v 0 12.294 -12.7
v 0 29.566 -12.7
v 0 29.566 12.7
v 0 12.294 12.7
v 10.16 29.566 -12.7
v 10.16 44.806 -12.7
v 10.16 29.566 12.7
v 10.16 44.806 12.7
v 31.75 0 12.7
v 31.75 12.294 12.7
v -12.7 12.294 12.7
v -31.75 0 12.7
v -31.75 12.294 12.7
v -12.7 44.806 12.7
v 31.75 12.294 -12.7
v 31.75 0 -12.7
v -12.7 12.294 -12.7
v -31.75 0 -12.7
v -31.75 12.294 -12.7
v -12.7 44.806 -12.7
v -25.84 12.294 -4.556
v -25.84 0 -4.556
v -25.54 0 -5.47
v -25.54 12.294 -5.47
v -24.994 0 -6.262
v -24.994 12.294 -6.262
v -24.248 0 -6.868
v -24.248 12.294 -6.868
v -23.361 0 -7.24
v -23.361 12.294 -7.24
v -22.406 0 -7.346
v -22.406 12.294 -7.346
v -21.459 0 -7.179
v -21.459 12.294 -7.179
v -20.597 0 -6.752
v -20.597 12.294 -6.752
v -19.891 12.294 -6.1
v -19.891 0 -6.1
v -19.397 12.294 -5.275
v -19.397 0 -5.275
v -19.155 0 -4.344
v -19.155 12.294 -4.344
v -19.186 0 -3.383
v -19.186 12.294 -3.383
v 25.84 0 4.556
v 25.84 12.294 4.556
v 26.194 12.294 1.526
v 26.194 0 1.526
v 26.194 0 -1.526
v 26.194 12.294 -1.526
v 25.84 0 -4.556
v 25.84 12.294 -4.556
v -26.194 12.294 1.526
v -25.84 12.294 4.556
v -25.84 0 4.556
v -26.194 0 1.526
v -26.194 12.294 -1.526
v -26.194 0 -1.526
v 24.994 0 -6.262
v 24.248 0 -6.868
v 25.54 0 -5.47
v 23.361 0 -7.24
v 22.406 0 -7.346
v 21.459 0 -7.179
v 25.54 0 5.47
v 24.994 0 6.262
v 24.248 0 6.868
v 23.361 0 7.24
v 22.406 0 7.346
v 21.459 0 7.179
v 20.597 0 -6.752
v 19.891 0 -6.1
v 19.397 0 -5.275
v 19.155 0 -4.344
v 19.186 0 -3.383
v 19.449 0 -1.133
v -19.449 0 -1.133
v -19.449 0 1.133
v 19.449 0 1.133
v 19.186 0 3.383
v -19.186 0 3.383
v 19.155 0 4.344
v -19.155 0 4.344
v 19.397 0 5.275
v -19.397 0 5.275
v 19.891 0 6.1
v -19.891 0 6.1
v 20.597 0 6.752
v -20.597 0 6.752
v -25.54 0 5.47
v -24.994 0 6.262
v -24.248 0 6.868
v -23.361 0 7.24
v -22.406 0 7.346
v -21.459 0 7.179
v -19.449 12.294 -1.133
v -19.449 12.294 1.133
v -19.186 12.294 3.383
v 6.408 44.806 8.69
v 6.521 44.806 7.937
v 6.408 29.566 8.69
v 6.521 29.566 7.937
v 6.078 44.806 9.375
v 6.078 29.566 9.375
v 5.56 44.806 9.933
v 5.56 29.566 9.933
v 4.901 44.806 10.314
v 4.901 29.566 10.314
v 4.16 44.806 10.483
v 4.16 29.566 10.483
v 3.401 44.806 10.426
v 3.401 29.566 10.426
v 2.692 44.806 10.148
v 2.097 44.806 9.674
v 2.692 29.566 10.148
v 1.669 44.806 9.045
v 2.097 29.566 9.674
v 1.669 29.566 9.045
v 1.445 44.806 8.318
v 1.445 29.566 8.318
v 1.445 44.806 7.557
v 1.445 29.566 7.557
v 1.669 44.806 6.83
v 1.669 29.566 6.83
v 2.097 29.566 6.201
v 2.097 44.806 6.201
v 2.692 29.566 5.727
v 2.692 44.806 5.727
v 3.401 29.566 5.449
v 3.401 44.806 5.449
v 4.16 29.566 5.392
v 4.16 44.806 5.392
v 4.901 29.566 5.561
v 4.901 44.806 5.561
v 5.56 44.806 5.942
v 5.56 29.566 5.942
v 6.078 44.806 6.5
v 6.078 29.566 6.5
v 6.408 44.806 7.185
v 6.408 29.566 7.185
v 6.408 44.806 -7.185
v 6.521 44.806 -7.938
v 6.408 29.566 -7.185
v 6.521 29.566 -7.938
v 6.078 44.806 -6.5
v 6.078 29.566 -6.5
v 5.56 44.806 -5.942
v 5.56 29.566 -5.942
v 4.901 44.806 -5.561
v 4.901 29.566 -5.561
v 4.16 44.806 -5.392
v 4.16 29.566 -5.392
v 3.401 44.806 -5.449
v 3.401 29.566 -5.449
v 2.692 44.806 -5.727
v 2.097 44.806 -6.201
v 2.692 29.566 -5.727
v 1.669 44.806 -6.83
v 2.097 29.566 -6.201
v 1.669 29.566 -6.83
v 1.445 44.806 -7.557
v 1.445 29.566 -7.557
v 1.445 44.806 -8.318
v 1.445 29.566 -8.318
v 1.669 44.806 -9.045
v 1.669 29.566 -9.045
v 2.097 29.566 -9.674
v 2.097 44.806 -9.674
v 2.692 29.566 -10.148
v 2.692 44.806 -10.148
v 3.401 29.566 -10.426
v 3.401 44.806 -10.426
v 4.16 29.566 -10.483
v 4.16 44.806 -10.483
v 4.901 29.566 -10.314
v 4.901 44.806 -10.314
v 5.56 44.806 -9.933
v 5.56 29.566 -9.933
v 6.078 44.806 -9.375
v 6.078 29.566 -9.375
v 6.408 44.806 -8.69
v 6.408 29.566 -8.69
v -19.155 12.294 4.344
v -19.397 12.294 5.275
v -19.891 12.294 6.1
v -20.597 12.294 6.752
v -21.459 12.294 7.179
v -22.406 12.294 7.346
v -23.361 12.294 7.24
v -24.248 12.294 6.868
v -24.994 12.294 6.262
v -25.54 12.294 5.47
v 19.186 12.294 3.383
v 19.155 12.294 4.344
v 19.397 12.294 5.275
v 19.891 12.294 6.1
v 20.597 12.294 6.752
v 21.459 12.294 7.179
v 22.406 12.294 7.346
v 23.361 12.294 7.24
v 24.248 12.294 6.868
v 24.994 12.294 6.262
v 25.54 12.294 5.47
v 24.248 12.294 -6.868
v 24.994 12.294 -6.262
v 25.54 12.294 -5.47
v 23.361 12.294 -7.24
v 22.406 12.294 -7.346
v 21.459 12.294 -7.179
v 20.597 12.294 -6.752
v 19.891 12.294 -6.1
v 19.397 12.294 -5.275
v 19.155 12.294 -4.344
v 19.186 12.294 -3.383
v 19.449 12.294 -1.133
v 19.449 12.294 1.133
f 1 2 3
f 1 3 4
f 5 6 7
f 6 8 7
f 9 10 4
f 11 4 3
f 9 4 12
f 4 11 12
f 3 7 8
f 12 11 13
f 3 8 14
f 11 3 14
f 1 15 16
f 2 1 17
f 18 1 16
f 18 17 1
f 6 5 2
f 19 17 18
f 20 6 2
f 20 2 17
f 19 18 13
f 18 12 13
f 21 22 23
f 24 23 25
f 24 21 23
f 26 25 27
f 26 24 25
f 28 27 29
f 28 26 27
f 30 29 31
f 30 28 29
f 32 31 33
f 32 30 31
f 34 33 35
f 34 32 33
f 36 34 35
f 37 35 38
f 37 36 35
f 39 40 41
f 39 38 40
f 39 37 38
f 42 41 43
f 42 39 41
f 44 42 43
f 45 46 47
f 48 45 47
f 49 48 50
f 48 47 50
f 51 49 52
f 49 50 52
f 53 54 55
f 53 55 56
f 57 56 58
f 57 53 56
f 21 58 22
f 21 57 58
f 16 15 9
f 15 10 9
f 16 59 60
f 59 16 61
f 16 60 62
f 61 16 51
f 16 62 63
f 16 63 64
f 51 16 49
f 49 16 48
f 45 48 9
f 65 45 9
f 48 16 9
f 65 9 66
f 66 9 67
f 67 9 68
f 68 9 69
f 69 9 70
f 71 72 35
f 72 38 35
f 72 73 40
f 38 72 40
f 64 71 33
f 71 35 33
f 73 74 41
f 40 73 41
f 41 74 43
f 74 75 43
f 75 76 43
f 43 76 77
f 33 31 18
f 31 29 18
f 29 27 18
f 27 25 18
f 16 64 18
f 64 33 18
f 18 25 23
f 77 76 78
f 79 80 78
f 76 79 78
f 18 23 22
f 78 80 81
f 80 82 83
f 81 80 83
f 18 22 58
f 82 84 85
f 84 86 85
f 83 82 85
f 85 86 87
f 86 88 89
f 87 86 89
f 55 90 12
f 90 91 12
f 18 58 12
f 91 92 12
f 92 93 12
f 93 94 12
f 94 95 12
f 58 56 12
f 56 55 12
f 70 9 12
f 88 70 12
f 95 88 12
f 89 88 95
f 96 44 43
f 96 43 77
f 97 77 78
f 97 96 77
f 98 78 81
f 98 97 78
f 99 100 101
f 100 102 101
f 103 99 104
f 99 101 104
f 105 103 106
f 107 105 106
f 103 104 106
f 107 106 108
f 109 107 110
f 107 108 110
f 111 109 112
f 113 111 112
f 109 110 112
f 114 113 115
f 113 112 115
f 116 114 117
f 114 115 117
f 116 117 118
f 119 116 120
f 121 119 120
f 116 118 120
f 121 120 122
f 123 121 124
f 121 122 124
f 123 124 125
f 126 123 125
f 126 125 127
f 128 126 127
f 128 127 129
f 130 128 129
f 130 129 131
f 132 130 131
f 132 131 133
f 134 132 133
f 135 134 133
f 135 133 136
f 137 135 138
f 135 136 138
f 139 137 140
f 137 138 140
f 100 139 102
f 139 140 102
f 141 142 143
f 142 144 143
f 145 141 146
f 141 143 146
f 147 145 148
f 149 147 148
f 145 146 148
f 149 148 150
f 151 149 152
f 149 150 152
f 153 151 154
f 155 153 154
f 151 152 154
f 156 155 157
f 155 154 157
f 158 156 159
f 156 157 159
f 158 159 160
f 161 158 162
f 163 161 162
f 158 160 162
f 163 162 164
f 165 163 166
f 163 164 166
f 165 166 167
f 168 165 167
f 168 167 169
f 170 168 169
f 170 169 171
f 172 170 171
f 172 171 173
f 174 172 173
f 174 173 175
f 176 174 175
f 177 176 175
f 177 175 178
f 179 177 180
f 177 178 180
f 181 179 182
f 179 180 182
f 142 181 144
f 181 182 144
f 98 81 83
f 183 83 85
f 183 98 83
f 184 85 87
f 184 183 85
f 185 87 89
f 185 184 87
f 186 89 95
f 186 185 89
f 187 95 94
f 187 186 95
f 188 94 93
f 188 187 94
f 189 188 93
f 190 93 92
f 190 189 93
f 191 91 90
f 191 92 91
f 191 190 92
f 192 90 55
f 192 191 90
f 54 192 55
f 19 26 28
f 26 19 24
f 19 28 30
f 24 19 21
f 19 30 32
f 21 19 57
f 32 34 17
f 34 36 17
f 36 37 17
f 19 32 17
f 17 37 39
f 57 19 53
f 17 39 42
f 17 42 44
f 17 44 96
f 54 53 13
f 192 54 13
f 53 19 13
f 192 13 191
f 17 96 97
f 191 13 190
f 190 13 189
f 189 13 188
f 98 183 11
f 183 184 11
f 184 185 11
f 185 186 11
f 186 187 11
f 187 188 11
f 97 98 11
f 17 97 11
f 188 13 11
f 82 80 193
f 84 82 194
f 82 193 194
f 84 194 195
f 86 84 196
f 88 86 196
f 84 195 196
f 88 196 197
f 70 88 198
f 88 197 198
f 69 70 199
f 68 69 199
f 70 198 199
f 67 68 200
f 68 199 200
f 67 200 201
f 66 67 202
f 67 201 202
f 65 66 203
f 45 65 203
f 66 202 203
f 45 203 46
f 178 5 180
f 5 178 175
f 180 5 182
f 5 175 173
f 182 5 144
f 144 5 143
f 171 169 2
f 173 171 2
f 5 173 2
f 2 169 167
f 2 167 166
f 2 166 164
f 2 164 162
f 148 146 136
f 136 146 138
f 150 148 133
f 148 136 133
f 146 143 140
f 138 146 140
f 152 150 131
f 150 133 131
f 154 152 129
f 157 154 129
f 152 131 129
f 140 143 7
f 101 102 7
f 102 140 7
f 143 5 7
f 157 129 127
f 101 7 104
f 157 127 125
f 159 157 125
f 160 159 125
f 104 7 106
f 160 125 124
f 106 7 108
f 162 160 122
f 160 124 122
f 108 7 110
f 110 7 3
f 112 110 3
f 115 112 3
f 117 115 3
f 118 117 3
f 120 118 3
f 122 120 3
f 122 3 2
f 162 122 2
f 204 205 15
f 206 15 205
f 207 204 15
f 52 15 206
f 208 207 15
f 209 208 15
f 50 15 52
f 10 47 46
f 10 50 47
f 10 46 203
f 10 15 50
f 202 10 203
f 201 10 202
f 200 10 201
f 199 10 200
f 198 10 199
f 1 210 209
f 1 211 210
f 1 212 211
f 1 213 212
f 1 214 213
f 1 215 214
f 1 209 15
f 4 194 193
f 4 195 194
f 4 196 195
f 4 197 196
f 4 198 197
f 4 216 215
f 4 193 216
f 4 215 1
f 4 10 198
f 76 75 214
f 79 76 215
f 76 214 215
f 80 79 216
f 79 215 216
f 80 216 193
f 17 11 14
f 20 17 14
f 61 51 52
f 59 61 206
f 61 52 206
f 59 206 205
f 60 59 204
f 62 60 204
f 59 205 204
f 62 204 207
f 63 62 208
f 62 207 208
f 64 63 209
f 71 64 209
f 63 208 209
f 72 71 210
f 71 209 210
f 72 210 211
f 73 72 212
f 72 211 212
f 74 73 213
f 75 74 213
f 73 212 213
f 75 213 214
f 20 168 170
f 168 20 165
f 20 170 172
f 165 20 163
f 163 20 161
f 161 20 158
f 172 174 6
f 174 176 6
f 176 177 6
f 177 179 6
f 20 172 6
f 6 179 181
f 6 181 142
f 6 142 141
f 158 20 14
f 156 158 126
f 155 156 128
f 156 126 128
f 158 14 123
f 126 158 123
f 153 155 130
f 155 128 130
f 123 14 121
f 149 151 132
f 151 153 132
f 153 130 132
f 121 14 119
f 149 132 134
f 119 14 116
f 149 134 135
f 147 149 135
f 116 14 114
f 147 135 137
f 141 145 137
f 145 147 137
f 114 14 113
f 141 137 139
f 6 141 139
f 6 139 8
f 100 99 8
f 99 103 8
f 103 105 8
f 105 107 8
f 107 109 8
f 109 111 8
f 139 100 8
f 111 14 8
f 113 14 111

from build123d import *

# Parameters (mm, degrees)
EXTRUDE1_DEPTH             = 12.7
ARC_MOUNTING_SLOT_I_DEPTH  = 48.184559381
CLAMPING_SCREW_HOLES_D     = 5.1054
CLAMPING_SCREW_HOLES_DEPTH = 15.24
CLAMPING_SCREW_HOLES_TIP   = 1.533816902


with BuildPart() as part:
    # Sketch1 → Extrude1 (new, symmetric)
    with BuildSketch(Plane.XY):
        Polygon((-12.7, 44.8056), (10.16, 44.8056), (10.16, 29.5656), (0, 29.5656), (0, 12.2936), (12.7, 12.2936), (31.75, 12.2936), (31.75, 0), (-31.75, 0), (-31.75, 12.2936), (-12.7, 12.2936), align=None)
    extrude(amount=EXTRUDE1_DEPTH, both=True)

    # Sketch2 → Arc mounting slot I (cut, through all)
    with BuildSketch(Plane(origin=(0, 12.2936, 0), x_dir=(-1, 0, 0), z_dir=(0, 1, 0))):
        with BuildLine():
            ThreePointArc((-25.839582785, -4.556215615), (-21.92608696, -7.296474893), (-19.185827683, -3.382979068))
            ThreePointArc((-19.185827683, -3.382979068), (-19.4818, 0), (-19.185827683, 3.382979068))
            ThreePointArc((-19.185827683, 3.382979068), (-21.92608696, 7.296474893), (-25.839582785, 4.556215615))
            ThreePointArc((-25.839582785, 4.556215615), (-26.2382, 0), (-25.839582785, -4.556215615))
        make_face()
    arc_mounting_slot_i = extrude(amount=-ARC_MOUNTING_SLOT_I_DEPTH, mode=Mode.SUBTRACT)

    # Arc mounting slot II: Arc mounting slot I across plane
    add(arc_mounting_slot_i.mirror(Plane(origin=(0, 0, 0), x_dir=(0, 0, 1), z_dir=(1, 0, 0))), mode=Mode.SUBTRACT)

    # Clamping screw holes
    with Locations(Plane(origin=(0, 44.8056, 0), x_dir=(-1, 0, 0), z_dir=(0, 1, 0))):
        with Locations((-3.96875, -7.9375), (-3.96875, 7.9375)):
            Hole(CLAMPING_SCREW_HOLES_D / 2, depth=CLAMPING_SCREW_HOLES_DEPTH)
            with Locations((0, 0, -(CLAMPING_SCREW_HOLES_DEPTH + CLAMPING_SCREW_HOLES_TIP / 2))):  # 118° drill point
                Cone(0, CLAMPING_SCREW_HOLES_D / 2, CLAMPING_SCREW_HOLES_TIP, mode=Mode.SUBTRACT)


solid = part.part
